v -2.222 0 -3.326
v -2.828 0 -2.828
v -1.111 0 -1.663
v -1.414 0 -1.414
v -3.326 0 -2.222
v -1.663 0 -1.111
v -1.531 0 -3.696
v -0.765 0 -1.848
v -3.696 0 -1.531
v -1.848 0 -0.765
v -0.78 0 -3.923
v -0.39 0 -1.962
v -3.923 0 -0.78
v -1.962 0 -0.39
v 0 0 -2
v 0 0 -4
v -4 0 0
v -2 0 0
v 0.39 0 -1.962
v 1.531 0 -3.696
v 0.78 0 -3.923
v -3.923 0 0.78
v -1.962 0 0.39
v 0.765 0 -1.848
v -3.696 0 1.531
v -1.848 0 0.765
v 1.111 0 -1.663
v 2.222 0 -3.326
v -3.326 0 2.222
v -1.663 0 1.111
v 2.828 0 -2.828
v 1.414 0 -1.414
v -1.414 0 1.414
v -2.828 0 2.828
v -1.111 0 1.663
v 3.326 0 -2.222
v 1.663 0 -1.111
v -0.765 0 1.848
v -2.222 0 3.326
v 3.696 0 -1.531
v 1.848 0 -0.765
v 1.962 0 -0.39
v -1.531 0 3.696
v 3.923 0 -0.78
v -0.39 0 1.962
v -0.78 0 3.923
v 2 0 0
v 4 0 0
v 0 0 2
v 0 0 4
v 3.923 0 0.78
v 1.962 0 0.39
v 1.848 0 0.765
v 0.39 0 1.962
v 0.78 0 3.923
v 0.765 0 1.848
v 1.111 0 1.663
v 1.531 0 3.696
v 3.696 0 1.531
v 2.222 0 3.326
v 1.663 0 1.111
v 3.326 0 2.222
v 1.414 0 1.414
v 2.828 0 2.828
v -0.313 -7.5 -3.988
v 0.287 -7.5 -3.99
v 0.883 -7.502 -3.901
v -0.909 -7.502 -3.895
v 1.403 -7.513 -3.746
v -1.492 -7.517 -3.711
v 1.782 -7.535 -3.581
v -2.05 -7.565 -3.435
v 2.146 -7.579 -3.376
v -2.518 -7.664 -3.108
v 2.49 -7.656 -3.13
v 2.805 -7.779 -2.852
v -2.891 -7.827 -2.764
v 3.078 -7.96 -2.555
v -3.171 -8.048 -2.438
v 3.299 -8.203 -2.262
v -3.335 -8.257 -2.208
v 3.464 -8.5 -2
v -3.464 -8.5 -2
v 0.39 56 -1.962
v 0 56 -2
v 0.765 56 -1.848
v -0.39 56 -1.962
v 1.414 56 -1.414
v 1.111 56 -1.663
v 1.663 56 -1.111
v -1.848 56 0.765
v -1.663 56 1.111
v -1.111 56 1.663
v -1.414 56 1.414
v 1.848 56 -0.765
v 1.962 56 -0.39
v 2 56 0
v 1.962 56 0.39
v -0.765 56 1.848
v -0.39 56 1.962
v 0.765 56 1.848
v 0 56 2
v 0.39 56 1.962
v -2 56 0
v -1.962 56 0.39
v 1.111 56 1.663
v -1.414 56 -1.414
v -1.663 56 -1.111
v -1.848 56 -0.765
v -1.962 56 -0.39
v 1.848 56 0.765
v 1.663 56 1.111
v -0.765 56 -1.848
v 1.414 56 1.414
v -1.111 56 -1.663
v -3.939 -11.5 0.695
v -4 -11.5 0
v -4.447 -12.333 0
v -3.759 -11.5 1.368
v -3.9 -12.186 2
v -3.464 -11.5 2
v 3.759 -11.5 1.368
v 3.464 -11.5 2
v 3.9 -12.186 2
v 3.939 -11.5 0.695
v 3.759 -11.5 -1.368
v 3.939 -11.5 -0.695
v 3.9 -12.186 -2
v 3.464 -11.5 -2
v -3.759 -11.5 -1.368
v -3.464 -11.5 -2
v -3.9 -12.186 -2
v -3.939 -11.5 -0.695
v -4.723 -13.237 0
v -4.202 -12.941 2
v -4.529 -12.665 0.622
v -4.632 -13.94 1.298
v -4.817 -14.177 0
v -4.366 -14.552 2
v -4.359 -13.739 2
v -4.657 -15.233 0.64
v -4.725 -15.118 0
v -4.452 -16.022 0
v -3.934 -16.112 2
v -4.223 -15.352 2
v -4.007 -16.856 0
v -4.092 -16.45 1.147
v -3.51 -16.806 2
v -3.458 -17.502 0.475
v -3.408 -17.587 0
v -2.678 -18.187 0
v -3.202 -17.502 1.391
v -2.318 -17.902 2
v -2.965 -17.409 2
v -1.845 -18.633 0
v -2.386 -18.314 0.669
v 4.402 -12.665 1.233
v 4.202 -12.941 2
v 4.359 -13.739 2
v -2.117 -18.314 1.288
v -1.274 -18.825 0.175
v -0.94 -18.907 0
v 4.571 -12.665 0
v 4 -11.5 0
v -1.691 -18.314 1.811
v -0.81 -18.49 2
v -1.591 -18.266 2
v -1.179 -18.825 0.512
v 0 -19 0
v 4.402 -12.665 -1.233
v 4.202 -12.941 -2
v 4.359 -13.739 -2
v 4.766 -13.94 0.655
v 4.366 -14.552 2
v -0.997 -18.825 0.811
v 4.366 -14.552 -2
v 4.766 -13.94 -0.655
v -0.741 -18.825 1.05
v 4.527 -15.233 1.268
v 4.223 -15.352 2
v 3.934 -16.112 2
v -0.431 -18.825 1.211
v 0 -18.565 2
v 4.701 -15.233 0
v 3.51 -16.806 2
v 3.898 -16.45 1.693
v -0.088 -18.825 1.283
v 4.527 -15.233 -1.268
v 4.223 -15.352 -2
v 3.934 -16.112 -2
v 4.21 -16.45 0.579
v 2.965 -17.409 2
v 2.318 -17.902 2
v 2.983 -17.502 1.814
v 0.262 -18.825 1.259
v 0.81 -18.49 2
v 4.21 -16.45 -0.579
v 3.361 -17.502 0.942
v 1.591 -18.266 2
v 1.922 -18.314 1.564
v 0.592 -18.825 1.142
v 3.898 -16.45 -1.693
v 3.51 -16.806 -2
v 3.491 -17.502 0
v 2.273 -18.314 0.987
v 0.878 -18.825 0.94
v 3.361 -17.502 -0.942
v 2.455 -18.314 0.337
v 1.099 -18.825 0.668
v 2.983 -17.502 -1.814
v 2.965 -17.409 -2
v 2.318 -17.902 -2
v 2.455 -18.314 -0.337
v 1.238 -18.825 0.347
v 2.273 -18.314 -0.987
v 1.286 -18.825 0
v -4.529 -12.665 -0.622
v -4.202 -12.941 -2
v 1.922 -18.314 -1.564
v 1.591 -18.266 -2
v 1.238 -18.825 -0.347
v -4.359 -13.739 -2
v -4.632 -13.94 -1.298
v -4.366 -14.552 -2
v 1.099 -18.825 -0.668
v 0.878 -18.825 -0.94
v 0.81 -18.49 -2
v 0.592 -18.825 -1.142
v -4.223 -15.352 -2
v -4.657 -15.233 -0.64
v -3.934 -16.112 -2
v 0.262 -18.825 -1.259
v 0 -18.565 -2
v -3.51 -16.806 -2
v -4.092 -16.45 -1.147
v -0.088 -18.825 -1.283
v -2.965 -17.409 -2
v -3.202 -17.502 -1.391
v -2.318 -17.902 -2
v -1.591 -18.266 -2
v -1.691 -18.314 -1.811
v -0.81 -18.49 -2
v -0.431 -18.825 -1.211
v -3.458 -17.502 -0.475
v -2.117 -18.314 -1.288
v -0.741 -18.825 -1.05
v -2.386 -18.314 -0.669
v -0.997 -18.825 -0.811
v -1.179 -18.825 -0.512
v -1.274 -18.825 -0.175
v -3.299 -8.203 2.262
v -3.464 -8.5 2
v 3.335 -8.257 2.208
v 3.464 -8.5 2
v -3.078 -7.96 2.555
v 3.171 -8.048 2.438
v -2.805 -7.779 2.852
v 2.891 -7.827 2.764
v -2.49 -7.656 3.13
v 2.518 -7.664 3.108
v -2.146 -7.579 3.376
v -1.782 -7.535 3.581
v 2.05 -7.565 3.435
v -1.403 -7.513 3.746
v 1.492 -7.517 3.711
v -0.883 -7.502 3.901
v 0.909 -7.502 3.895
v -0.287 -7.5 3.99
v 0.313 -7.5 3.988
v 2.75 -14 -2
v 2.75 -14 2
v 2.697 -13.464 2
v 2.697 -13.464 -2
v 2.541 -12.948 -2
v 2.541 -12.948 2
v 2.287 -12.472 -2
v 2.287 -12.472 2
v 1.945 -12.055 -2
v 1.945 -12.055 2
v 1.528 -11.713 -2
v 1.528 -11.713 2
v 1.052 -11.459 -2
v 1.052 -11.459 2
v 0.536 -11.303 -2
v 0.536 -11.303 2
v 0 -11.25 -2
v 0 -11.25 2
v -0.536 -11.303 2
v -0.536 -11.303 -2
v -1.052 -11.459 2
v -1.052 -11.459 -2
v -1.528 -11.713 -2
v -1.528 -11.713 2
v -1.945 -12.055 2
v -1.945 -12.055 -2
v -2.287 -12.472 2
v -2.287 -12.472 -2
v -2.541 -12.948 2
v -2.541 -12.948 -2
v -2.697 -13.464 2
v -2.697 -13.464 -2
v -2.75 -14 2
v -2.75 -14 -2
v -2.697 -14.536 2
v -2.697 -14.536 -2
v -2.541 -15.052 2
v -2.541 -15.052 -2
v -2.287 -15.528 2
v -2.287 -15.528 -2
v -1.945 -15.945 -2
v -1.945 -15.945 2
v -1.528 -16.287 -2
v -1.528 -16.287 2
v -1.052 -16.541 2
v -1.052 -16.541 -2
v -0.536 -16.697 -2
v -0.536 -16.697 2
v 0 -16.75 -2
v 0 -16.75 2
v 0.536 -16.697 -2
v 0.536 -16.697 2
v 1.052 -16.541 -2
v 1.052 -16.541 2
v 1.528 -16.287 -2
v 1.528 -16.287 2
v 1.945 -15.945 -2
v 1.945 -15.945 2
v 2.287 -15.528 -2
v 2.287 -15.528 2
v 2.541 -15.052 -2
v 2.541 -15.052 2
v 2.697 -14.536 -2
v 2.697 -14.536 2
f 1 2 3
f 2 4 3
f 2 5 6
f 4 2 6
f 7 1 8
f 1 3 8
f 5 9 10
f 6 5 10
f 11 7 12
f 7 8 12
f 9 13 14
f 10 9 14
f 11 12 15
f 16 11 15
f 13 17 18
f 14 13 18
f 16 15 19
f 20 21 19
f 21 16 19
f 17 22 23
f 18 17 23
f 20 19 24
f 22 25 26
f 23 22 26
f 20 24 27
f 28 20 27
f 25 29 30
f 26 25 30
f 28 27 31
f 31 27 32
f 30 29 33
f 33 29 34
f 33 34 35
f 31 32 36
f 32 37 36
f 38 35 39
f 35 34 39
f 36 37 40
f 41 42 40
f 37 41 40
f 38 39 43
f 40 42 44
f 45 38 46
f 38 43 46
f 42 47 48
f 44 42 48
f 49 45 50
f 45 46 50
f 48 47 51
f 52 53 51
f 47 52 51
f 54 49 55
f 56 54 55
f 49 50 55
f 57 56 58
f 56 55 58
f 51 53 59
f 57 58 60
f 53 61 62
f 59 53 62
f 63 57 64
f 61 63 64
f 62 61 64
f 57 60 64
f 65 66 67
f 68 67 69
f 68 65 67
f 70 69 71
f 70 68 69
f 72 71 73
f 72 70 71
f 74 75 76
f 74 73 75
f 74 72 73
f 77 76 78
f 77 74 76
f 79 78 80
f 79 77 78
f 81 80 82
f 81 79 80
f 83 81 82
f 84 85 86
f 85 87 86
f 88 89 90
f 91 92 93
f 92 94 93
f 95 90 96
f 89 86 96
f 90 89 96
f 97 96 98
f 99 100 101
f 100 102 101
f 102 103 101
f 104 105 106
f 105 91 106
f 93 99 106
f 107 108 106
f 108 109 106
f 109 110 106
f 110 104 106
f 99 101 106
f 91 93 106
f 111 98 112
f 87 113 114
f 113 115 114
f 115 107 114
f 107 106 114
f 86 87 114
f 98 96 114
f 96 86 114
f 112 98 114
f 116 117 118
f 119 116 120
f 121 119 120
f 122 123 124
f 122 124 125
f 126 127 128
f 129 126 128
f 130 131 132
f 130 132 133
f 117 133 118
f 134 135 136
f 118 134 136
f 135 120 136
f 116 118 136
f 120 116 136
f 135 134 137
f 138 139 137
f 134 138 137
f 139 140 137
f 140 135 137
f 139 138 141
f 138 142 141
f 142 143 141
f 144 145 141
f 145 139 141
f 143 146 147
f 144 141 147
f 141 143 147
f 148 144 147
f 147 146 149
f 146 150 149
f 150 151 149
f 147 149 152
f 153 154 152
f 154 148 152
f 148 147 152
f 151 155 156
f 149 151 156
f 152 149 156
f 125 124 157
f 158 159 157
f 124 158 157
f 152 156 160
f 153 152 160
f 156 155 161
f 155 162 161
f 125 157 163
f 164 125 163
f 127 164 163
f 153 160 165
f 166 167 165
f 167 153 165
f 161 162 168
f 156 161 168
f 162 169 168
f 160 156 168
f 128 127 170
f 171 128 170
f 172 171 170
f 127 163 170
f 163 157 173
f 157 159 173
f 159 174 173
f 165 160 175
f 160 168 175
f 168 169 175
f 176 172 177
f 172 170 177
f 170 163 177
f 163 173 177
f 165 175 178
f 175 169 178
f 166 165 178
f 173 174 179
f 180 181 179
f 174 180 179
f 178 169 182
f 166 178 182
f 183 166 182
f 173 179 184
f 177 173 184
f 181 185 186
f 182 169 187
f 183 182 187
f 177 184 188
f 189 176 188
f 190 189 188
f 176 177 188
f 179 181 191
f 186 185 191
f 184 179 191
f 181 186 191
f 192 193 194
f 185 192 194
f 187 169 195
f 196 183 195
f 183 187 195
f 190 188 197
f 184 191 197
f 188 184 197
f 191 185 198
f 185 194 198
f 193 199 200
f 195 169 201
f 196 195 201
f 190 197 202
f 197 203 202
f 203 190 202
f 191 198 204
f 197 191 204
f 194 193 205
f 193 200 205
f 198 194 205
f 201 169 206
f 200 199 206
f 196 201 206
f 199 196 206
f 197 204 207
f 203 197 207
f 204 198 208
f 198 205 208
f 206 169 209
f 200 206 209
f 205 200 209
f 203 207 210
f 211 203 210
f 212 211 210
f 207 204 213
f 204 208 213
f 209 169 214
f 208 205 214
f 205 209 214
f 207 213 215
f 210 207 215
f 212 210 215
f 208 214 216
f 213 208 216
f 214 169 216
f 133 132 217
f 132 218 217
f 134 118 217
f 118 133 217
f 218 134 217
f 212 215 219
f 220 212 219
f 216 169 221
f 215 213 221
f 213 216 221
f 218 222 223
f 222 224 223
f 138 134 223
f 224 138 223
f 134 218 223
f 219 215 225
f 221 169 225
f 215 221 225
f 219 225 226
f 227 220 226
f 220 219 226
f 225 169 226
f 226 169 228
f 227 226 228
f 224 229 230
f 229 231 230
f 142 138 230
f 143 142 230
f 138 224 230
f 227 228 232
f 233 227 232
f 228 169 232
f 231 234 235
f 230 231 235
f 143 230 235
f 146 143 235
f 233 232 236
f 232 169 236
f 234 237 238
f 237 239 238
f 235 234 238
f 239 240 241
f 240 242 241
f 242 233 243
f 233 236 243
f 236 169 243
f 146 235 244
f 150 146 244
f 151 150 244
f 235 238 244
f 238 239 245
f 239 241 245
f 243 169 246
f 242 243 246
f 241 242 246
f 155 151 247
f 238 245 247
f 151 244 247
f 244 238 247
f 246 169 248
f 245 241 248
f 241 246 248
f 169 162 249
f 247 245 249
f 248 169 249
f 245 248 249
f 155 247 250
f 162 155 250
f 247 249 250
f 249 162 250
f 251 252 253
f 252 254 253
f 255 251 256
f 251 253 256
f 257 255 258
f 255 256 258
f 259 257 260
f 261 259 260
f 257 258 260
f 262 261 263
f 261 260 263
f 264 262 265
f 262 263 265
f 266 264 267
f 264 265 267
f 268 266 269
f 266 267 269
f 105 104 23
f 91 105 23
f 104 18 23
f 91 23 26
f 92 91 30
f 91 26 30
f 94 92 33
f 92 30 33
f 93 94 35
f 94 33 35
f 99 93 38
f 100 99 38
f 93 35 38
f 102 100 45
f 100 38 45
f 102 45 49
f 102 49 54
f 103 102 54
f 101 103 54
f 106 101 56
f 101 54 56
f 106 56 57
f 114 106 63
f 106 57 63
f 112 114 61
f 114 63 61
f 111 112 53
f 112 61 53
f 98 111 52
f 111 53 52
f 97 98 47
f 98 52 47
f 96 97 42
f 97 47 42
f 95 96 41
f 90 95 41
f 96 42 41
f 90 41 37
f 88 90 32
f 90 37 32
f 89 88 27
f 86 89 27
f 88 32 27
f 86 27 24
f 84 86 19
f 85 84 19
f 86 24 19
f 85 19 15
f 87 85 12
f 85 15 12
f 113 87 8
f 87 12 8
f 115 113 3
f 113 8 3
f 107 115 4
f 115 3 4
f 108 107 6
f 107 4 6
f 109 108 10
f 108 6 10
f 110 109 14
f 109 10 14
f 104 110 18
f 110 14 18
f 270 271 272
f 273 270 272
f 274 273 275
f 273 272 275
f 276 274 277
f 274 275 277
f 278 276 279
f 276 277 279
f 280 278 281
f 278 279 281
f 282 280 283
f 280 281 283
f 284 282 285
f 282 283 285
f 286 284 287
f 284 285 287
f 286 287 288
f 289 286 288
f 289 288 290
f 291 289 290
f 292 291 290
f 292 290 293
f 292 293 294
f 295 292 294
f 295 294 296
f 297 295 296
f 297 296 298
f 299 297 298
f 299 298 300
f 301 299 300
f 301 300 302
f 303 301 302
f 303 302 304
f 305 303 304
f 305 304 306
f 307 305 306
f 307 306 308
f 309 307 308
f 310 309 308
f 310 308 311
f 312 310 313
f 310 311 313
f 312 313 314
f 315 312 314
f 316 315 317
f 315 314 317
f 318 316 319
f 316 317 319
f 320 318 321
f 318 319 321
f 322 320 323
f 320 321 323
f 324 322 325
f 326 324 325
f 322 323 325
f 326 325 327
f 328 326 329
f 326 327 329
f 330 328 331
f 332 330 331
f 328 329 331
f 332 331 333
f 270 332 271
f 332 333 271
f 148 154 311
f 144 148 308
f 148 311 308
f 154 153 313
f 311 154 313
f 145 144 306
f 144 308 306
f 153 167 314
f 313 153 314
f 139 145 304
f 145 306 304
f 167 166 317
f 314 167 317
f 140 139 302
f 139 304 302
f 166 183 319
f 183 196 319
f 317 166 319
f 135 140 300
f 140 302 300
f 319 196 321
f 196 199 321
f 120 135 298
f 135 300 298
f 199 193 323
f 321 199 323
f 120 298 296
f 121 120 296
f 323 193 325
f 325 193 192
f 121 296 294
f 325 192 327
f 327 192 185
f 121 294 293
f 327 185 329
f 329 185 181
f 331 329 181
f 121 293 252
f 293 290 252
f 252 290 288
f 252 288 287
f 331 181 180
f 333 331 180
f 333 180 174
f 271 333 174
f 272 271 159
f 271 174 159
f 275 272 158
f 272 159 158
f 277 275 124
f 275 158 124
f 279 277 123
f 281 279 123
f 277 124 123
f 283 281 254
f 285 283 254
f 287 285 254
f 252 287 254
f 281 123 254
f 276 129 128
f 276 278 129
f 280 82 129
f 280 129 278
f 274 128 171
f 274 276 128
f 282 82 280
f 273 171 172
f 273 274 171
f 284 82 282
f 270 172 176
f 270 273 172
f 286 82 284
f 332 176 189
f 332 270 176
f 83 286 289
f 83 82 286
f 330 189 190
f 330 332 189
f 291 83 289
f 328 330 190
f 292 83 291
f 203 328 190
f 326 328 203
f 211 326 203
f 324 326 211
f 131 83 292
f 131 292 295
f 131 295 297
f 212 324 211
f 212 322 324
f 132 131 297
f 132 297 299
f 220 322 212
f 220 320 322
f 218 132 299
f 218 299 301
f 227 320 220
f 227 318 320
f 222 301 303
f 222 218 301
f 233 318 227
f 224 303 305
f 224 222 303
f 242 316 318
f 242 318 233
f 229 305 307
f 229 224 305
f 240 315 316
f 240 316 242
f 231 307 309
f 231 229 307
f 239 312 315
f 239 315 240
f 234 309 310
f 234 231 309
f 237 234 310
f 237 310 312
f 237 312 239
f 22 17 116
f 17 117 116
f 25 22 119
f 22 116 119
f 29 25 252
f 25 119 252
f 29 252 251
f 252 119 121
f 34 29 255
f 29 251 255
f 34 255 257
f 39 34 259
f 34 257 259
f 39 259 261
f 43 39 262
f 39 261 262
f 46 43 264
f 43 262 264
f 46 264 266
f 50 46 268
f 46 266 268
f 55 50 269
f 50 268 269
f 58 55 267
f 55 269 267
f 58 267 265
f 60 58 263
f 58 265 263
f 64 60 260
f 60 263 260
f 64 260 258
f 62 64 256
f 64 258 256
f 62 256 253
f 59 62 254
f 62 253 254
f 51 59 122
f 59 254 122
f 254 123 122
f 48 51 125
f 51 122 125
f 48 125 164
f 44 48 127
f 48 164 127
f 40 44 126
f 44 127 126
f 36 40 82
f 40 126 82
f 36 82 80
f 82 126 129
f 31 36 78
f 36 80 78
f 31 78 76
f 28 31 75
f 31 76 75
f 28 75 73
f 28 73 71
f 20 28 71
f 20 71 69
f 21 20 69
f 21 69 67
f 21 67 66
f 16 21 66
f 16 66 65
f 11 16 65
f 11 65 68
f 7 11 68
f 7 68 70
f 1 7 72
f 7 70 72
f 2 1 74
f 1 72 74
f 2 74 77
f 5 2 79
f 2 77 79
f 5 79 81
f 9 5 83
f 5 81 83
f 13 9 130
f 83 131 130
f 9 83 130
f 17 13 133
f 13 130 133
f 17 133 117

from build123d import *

# Parameters (mm, degrees)
CUT_EXTRUDE1_DEPTH      = 5.816666667
CUT_EXTRUDE1_DEPTH_BACK = 10
SKETCH3_R               = 2.75
CUT_EXTRUDE2_DEPTH      = 3.0000001
CUT_EXTRUDE2_DEPTH_BACK = 7.0000001


with BuildPart() as part:
    # Sketch1 → Revolve1 (revolve)
    with BuildSketch(Plane.XY):
        with BuildLine():
            Line((0, 0), (0, 56))
            Line((0, 56), (-2, 56))
            Line((-2, 56), (-2, 0))
            Line((-2, 0), (-4, 0))
            Line((-4, 0), (-4, -11.5))
            ThreePointArc((-4, -11.5), (-4.25, -16.45), (0, -19))
            Line((0, -19), (0, 0))
        make_face()
    revolve(axis=Axis((0, 0, 0), (0, 1, 0)))

    # Sketch2 → Cut-Extrude1 (cut, two sides)
    with BuildSketch(Plane(origin=(0, 0, 0), x_dir=(0, 0, -1), z_dir=(1, 0, 0))) as cut_extrude1_sk:
        with BuildLine():
            ThreePointArc((-2, -8.5), (-2.881966011, -7.763932023), (-4, -7.5))
            Line((-4, -7.5), (-4, -8.077978136))
            ThreePointArc((-4, -8.077978136), (-6.041123222, -13.901532194), (-2, -18.56514549))
            Line((-2, -18.56514549), (-2, -11.5))
            Line((-2, -11.5), (-2, -8.5))
        make_face()
        with BuildLine():
            Line((4, -8.077978136), (4, -7.5))
            ThreePointArc((4, -7.5), (2.881966011, -7.763932023), (2, -8.5))
            Line((2, -8.5), (2, -11.5))
            Line((2, -11.5), (2, -18.56514549))
            ThreePointArc((2, -18.56514549), (6.041123222, -13.901532194), (4, -8.077978136))
        make_face()
    extrude(amount=CUT_EXTRUDE1_DEPTH, mode=Mode.SUBTRACT)
    extrude(cut_extrude1_sk.sketch, amount=-CUT_EXTRUDE1_DEPTH_BACK, mode=Mode.SUBTRACT)

    # Sketch3 → Cut-Extrude2 (cut, two sides)
    with BuildSketch(Plane.XY.offset(2)) as cut_extrude2_sk:
        with Locations((0, -14)):
            Circle(SKETCH3_R)
    extrude(amount=CUT_EXTRUDE2_DEPTH, mode=Mode.SUBTRACT)
    extrude(cut_extrude2_sk.sketch, amount=-CUT_EXTRUDE2_DEPTH_BACK, mode=Mode.SUBTRACT)


solid = part.part
